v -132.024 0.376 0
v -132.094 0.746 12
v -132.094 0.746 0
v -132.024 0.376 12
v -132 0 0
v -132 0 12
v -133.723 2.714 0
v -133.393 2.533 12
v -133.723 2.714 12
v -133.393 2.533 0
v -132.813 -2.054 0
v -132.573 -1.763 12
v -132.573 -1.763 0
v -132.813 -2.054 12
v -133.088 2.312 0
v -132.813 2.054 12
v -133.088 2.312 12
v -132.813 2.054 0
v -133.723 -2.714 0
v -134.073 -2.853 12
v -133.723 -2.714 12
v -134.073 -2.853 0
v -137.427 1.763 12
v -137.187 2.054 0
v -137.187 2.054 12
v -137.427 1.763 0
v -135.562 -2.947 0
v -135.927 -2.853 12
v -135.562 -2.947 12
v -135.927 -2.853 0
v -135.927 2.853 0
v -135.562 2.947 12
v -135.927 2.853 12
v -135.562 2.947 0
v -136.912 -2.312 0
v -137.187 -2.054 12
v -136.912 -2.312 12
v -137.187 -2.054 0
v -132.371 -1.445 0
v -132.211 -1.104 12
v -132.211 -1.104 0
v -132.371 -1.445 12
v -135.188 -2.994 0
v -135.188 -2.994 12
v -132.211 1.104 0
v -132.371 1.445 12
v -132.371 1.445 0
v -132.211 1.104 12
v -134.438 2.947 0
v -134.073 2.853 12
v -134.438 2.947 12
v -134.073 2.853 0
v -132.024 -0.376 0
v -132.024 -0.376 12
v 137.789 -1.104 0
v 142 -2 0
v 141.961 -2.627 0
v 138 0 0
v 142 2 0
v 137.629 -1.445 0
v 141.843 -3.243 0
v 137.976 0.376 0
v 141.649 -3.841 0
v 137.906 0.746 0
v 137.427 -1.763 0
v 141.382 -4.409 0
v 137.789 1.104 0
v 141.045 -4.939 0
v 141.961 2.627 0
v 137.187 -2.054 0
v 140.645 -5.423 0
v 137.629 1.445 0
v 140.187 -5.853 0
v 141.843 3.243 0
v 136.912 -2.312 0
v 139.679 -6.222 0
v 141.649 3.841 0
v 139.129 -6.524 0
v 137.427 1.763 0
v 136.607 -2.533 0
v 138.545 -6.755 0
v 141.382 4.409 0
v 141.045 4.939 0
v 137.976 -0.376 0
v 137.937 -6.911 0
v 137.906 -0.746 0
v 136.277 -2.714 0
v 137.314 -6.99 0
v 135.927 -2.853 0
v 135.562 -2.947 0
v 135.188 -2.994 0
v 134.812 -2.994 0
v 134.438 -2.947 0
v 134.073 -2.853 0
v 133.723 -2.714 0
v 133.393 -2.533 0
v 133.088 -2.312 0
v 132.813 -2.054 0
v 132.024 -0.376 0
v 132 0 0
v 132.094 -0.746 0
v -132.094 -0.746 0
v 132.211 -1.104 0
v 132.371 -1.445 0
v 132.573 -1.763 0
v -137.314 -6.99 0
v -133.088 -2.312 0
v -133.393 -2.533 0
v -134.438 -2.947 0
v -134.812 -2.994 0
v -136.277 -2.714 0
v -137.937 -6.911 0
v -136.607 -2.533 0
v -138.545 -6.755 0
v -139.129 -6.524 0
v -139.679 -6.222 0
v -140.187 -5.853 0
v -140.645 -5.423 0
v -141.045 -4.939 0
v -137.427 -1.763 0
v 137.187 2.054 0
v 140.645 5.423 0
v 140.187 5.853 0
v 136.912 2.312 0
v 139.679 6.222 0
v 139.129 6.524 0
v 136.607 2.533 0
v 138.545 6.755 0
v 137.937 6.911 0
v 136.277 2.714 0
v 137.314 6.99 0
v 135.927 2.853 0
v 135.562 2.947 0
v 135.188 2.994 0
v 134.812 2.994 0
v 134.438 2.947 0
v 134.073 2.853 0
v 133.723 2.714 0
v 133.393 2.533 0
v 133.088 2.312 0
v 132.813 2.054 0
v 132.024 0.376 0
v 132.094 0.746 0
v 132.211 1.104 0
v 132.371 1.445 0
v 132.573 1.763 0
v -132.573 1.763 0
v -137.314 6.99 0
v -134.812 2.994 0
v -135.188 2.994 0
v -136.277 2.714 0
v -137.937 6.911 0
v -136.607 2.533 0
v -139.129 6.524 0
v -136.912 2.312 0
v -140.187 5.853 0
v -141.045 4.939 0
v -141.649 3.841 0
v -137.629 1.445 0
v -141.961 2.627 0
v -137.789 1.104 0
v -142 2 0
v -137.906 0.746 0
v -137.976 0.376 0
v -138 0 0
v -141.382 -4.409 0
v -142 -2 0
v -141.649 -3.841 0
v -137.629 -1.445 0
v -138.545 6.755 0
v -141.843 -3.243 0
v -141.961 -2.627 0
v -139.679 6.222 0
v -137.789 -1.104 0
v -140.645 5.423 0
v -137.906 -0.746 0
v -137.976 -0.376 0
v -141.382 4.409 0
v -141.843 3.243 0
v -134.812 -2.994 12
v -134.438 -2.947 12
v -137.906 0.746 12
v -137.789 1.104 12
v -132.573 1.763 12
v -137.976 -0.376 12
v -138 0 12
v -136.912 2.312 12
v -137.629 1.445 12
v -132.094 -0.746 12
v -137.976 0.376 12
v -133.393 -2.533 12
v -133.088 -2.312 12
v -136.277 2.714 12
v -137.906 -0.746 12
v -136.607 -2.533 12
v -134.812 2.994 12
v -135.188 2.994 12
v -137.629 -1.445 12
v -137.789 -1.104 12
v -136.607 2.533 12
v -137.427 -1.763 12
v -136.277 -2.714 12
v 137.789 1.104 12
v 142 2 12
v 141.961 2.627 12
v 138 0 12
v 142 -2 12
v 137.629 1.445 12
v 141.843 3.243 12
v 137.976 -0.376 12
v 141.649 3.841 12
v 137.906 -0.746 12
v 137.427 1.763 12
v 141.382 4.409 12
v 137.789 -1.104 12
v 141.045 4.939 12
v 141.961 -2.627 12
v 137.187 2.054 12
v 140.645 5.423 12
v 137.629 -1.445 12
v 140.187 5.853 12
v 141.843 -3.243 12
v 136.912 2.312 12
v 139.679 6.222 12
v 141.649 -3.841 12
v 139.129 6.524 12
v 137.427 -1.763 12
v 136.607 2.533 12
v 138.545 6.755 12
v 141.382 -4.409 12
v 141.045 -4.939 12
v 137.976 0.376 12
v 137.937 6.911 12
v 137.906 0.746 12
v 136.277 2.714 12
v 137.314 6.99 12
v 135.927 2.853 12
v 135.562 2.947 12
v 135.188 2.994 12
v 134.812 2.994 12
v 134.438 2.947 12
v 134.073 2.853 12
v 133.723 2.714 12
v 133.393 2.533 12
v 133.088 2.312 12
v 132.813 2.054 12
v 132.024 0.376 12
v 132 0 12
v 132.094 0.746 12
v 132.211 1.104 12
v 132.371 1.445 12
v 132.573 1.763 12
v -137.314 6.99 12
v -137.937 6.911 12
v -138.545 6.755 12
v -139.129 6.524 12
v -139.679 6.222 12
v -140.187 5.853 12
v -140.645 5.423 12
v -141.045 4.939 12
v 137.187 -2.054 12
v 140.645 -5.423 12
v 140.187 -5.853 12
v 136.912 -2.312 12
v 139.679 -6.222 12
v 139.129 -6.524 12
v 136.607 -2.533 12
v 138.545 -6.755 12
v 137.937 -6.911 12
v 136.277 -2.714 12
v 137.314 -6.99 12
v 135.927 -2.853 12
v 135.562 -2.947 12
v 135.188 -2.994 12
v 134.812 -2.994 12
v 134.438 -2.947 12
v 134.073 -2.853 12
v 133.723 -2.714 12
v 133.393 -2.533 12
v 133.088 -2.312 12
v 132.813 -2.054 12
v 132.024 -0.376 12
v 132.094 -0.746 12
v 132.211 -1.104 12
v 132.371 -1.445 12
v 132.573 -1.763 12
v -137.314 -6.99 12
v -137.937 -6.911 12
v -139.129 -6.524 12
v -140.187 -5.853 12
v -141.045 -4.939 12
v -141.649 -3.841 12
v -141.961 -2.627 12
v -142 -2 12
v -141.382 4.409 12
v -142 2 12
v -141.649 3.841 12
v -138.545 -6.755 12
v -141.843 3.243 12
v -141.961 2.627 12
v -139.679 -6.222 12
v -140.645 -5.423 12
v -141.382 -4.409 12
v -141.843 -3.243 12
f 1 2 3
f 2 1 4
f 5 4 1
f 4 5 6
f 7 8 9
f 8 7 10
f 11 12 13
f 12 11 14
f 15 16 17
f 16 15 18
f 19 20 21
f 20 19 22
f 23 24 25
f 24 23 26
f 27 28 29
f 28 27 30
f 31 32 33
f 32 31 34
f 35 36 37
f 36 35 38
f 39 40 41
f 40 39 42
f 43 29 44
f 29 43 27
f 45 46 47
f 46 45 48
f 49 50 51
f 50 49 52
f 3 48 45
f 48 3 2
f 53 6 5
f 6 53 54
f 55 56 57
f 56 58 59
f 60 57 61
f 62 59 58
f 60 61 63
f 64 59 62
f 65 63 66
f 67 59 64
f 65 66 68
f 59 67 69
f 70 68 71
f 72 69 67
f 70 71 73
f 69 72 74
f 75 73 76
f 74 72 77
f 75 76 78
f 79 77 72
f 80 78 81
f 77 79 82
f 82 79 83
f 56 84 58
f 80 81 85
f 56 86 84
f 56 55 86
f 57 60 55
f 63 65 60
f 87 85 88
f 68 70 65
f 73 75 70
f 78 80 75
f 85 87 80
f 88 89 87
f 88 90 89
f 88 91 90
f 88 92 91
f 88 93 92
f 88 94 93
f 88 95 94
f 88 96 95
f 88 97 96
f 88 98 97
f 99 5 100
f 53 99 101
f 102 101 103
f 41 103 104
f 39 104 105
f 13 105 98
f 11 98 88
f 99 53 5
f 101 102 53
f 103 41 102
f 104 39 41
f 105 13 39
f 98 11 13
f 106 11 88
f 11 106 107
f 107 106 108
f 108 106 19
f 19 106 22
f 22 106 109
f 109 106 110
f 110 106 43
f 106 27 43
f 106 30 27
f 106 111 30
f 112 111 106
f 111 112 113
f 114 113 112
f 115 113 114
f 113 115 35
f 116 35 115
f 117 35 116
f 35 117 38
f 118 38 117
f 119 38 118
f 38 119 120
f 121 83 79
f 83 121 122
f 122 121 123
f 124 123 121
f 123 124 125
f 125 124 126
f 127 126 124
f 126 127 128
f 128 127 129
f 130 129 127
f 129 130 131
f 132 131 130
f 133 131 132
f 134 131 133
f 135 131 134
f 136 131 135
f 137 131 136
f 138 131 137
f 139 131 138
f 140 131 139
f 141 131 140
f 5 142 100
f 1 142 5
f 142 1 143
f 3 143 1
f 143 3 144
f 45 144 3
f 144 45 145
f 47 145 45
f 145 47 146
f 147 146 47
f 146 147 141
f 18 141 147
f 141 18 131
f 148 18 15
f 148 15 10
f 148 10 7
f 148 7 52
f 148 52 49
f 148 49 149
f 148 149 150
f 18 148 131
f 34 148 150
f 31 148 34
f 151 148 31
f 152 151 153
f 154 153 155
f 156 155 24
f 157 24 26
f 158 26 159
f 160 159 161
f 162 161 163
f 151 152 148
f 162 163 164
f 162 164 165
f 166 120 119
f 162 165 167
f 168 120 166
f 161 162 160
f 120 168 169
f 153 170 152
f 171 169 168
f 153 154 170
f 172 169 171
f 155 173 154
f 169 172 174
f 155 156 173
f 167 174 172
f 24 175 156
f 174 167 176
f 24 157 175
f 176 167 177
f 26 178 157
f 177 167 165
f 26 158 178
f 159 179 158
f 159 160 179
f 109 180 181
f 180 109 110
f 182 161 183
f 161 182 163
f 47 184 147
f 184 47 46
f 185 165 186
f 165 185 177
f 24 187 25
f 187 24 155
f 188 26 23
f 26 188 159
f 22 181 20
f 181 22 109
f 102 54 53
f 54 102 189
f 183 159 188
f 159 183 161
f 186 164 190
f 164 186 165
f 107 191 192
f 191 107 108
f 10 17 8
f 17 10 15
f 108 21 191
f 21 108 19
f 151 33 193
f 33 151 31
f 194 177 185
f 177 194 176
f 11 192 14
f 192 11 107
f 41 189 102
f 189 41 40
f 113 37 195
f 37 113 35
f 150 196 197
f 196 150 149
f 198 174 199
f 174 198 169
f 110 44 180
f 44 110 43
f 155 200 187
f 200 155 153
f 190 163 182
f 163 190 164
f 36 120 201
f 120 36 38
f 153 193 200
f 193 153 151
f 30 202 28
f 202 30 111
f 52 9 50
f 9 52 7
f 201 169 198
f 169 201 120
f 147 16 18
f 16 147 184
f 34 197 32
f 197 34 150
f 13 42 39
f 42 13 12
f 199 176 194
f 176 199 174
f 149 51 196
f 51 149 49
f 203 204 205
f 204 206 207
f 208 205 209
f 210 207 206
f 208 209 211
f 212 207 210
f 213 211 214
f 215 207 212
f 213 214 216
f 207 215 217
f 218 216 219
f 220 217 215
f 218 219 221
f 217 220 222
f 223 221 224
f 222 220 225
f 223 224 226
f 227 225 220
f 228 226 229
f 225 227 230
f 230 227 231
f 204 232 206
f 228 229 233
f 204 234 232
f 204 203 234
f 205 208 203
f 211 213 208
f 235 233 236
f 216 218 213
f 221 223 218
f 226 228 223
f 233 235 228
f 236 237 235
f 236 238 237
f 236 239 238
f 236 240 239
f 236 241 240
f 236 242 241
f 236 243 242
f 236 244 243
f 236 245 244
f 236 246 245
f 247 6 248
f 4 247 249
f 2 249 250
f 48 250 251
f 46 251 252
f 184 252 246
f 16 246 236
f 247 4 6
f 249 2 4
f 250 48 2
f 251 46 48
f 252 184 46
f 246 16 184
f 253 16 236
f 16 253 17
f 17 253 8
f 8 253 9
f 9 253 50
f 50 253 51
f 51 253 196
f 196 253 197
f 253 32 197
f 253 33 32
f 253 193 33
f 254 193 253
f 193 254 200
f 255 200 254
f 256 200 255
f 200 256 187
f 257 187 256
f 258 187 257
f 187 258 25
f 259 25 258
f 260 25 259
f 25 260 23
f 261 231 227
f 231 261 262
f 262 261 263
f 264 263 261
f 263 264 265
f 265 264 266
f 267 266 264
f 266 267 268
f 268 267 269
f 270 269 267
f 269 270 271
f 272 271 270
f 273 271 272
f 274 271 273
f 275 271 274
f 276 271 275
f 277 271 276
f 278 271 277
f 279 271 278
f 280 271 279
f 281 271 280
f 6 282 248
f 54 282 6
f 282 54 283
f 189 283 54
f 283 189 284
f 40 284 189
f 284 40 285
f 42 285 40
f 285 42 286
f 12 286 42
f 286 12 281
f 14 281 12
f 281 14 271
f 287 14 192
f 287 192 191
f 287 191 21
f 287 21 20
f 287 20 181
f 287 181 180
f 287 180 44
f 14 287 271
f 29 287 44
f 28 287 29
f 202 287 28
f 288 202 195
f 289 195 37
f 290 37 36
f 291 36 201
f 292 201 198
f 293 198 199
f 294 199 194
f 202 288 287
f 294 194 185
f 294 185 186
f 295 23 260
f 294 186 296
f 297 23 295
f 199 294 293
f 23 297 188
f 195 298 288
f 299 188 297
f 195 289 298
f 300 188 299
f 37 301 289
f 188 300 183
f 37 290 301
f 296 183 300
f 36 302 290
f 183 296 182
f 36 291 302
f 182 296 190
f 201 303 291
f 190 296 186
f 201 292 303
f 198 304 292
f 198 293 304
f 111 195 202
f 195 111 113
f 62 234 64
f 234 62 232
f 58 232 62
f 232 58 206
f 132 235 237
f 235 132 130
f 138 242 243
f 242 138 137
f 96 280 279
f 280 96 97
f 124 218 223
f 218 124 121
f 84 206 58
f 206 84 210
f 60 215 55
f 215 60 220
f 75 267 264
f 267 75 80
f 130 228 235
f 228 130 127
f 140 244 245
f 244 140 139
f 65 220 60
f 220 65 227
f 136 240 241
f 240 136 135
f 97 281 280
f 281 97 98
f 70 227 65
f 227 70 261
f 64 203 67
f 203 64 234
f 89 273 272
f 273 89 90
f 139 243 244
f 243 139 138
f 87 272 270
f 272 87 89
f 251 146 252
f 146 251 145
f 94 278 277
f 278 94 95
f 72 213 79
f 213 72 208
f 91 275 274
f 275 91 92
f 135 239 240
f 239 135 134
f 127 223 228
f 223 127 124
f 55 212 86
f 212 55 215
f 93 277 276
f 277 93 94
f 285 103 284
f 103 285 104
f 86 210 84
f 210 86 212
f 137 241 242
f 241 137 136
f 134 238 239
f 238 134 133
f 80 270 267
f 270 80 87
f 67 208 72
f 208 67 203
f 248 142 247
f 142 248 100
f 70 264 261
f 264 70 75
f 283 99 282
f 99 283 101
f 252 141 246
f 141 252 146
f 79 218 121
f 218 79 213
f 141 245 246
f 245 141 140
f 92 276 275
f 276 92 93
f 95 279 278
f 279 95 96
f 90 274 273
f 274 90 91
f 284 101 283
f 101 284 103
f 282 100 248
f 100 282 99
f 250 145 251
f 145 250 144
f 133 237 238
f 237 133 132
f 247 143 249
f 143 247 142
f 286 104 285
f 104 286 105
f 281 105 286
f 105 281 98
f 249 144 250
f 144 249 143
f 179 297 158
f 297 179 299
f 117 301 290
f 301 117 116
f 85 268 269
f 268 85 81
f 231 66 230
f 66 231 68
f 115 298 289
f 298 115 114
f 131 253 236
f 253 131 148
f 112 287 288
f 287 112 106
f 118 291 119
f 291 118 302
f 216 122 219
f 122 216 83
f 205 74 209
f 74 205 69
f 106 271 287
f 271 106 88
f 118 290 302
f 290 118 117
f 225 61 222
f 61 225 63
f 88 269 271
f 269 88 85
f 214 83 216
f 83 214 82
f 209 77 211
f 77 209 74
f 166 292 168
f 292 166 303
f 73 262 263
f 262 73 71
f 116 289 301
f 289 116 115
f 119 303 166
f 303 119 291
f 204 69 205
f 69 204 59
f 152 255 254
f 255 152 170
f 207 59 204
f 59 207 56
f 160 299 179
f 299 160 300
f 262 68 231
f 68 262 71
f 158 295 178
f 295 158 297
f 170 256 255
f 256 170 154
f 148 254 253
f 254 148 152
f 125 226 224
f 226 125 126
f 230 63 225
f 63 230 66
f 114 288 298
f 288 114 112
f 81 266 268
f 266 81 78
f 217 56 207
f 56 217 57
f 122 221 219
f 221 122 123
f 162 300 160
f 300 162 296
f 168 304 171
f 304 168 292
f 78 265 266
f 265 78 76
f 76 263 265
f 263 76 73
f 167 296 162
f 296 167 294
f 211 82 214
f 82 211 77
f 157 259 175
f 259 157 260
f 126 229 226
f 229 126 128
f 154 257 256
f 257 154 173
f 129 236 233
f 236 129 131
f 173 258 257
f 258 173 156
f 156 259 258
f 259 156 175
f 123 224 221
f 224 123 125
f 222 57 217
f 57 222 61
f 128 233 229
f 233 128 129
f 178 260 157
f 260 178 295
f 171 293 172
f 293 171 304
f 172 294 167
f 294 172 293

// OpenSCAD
$fn = 50;


difference() {
	union() {
		hull() {
			translate(v = [-137.0000000000, 2.0000000000, 0]) {
				cylinder(h = 12, r = 5);
			}
			translate(v = [137.0000000000, 2.0000000000, 0]) {
				cylinder(h = 12, r = 5);
			}
			translate(v = [-137.0000000000, -2.0000000000, 0]) {
				cylinder(h = 12, r = 5);
			}
			translate(v = [137.0000000000, -2.0000000000, 0]) {
				cylinder(h = 12, r = 5);
			}
		}
	}
	union() {
		translate(v = [-135.0000000000, 0.0000000000, 0]) {
			cylinder(h = 12, r = 3.0000000000);
		}
		translate(v = [135.0000000000, 0.0000000000, 0]) {
			cylinder(h = 12, r = 3.0000000000);
		}
		translate(v = [-135.0000000000, 0.0000000000, 0]) {
			cylinder(h = 12, r = 1.5000000000);
		}
		translate(v = [135.0000000000, 0.0000000000, 0]) {
			cylinder(h = 12, r = 1.5000000000);
		}
		translate(v = [-135.0000000000, 0.0000000000, 0]) {
			cylinder(h = 12, r = 1.5000000000);
		}
		translate(v = [135.0000000000, 0.0000000000, 0]) {
			cylinder(h = 12, r = 1.5000000000);
		}
		translate(v = [-135.0000000000, 0.0000000000, 0]) {
			cylinder(h = 12, r = 1.5000000000);
		}
		translate(v = [135.0000000000, 0.0000000000, 0]) {
			cylinder(h = 12, r = 1.5000000000);
		}
	}
}
